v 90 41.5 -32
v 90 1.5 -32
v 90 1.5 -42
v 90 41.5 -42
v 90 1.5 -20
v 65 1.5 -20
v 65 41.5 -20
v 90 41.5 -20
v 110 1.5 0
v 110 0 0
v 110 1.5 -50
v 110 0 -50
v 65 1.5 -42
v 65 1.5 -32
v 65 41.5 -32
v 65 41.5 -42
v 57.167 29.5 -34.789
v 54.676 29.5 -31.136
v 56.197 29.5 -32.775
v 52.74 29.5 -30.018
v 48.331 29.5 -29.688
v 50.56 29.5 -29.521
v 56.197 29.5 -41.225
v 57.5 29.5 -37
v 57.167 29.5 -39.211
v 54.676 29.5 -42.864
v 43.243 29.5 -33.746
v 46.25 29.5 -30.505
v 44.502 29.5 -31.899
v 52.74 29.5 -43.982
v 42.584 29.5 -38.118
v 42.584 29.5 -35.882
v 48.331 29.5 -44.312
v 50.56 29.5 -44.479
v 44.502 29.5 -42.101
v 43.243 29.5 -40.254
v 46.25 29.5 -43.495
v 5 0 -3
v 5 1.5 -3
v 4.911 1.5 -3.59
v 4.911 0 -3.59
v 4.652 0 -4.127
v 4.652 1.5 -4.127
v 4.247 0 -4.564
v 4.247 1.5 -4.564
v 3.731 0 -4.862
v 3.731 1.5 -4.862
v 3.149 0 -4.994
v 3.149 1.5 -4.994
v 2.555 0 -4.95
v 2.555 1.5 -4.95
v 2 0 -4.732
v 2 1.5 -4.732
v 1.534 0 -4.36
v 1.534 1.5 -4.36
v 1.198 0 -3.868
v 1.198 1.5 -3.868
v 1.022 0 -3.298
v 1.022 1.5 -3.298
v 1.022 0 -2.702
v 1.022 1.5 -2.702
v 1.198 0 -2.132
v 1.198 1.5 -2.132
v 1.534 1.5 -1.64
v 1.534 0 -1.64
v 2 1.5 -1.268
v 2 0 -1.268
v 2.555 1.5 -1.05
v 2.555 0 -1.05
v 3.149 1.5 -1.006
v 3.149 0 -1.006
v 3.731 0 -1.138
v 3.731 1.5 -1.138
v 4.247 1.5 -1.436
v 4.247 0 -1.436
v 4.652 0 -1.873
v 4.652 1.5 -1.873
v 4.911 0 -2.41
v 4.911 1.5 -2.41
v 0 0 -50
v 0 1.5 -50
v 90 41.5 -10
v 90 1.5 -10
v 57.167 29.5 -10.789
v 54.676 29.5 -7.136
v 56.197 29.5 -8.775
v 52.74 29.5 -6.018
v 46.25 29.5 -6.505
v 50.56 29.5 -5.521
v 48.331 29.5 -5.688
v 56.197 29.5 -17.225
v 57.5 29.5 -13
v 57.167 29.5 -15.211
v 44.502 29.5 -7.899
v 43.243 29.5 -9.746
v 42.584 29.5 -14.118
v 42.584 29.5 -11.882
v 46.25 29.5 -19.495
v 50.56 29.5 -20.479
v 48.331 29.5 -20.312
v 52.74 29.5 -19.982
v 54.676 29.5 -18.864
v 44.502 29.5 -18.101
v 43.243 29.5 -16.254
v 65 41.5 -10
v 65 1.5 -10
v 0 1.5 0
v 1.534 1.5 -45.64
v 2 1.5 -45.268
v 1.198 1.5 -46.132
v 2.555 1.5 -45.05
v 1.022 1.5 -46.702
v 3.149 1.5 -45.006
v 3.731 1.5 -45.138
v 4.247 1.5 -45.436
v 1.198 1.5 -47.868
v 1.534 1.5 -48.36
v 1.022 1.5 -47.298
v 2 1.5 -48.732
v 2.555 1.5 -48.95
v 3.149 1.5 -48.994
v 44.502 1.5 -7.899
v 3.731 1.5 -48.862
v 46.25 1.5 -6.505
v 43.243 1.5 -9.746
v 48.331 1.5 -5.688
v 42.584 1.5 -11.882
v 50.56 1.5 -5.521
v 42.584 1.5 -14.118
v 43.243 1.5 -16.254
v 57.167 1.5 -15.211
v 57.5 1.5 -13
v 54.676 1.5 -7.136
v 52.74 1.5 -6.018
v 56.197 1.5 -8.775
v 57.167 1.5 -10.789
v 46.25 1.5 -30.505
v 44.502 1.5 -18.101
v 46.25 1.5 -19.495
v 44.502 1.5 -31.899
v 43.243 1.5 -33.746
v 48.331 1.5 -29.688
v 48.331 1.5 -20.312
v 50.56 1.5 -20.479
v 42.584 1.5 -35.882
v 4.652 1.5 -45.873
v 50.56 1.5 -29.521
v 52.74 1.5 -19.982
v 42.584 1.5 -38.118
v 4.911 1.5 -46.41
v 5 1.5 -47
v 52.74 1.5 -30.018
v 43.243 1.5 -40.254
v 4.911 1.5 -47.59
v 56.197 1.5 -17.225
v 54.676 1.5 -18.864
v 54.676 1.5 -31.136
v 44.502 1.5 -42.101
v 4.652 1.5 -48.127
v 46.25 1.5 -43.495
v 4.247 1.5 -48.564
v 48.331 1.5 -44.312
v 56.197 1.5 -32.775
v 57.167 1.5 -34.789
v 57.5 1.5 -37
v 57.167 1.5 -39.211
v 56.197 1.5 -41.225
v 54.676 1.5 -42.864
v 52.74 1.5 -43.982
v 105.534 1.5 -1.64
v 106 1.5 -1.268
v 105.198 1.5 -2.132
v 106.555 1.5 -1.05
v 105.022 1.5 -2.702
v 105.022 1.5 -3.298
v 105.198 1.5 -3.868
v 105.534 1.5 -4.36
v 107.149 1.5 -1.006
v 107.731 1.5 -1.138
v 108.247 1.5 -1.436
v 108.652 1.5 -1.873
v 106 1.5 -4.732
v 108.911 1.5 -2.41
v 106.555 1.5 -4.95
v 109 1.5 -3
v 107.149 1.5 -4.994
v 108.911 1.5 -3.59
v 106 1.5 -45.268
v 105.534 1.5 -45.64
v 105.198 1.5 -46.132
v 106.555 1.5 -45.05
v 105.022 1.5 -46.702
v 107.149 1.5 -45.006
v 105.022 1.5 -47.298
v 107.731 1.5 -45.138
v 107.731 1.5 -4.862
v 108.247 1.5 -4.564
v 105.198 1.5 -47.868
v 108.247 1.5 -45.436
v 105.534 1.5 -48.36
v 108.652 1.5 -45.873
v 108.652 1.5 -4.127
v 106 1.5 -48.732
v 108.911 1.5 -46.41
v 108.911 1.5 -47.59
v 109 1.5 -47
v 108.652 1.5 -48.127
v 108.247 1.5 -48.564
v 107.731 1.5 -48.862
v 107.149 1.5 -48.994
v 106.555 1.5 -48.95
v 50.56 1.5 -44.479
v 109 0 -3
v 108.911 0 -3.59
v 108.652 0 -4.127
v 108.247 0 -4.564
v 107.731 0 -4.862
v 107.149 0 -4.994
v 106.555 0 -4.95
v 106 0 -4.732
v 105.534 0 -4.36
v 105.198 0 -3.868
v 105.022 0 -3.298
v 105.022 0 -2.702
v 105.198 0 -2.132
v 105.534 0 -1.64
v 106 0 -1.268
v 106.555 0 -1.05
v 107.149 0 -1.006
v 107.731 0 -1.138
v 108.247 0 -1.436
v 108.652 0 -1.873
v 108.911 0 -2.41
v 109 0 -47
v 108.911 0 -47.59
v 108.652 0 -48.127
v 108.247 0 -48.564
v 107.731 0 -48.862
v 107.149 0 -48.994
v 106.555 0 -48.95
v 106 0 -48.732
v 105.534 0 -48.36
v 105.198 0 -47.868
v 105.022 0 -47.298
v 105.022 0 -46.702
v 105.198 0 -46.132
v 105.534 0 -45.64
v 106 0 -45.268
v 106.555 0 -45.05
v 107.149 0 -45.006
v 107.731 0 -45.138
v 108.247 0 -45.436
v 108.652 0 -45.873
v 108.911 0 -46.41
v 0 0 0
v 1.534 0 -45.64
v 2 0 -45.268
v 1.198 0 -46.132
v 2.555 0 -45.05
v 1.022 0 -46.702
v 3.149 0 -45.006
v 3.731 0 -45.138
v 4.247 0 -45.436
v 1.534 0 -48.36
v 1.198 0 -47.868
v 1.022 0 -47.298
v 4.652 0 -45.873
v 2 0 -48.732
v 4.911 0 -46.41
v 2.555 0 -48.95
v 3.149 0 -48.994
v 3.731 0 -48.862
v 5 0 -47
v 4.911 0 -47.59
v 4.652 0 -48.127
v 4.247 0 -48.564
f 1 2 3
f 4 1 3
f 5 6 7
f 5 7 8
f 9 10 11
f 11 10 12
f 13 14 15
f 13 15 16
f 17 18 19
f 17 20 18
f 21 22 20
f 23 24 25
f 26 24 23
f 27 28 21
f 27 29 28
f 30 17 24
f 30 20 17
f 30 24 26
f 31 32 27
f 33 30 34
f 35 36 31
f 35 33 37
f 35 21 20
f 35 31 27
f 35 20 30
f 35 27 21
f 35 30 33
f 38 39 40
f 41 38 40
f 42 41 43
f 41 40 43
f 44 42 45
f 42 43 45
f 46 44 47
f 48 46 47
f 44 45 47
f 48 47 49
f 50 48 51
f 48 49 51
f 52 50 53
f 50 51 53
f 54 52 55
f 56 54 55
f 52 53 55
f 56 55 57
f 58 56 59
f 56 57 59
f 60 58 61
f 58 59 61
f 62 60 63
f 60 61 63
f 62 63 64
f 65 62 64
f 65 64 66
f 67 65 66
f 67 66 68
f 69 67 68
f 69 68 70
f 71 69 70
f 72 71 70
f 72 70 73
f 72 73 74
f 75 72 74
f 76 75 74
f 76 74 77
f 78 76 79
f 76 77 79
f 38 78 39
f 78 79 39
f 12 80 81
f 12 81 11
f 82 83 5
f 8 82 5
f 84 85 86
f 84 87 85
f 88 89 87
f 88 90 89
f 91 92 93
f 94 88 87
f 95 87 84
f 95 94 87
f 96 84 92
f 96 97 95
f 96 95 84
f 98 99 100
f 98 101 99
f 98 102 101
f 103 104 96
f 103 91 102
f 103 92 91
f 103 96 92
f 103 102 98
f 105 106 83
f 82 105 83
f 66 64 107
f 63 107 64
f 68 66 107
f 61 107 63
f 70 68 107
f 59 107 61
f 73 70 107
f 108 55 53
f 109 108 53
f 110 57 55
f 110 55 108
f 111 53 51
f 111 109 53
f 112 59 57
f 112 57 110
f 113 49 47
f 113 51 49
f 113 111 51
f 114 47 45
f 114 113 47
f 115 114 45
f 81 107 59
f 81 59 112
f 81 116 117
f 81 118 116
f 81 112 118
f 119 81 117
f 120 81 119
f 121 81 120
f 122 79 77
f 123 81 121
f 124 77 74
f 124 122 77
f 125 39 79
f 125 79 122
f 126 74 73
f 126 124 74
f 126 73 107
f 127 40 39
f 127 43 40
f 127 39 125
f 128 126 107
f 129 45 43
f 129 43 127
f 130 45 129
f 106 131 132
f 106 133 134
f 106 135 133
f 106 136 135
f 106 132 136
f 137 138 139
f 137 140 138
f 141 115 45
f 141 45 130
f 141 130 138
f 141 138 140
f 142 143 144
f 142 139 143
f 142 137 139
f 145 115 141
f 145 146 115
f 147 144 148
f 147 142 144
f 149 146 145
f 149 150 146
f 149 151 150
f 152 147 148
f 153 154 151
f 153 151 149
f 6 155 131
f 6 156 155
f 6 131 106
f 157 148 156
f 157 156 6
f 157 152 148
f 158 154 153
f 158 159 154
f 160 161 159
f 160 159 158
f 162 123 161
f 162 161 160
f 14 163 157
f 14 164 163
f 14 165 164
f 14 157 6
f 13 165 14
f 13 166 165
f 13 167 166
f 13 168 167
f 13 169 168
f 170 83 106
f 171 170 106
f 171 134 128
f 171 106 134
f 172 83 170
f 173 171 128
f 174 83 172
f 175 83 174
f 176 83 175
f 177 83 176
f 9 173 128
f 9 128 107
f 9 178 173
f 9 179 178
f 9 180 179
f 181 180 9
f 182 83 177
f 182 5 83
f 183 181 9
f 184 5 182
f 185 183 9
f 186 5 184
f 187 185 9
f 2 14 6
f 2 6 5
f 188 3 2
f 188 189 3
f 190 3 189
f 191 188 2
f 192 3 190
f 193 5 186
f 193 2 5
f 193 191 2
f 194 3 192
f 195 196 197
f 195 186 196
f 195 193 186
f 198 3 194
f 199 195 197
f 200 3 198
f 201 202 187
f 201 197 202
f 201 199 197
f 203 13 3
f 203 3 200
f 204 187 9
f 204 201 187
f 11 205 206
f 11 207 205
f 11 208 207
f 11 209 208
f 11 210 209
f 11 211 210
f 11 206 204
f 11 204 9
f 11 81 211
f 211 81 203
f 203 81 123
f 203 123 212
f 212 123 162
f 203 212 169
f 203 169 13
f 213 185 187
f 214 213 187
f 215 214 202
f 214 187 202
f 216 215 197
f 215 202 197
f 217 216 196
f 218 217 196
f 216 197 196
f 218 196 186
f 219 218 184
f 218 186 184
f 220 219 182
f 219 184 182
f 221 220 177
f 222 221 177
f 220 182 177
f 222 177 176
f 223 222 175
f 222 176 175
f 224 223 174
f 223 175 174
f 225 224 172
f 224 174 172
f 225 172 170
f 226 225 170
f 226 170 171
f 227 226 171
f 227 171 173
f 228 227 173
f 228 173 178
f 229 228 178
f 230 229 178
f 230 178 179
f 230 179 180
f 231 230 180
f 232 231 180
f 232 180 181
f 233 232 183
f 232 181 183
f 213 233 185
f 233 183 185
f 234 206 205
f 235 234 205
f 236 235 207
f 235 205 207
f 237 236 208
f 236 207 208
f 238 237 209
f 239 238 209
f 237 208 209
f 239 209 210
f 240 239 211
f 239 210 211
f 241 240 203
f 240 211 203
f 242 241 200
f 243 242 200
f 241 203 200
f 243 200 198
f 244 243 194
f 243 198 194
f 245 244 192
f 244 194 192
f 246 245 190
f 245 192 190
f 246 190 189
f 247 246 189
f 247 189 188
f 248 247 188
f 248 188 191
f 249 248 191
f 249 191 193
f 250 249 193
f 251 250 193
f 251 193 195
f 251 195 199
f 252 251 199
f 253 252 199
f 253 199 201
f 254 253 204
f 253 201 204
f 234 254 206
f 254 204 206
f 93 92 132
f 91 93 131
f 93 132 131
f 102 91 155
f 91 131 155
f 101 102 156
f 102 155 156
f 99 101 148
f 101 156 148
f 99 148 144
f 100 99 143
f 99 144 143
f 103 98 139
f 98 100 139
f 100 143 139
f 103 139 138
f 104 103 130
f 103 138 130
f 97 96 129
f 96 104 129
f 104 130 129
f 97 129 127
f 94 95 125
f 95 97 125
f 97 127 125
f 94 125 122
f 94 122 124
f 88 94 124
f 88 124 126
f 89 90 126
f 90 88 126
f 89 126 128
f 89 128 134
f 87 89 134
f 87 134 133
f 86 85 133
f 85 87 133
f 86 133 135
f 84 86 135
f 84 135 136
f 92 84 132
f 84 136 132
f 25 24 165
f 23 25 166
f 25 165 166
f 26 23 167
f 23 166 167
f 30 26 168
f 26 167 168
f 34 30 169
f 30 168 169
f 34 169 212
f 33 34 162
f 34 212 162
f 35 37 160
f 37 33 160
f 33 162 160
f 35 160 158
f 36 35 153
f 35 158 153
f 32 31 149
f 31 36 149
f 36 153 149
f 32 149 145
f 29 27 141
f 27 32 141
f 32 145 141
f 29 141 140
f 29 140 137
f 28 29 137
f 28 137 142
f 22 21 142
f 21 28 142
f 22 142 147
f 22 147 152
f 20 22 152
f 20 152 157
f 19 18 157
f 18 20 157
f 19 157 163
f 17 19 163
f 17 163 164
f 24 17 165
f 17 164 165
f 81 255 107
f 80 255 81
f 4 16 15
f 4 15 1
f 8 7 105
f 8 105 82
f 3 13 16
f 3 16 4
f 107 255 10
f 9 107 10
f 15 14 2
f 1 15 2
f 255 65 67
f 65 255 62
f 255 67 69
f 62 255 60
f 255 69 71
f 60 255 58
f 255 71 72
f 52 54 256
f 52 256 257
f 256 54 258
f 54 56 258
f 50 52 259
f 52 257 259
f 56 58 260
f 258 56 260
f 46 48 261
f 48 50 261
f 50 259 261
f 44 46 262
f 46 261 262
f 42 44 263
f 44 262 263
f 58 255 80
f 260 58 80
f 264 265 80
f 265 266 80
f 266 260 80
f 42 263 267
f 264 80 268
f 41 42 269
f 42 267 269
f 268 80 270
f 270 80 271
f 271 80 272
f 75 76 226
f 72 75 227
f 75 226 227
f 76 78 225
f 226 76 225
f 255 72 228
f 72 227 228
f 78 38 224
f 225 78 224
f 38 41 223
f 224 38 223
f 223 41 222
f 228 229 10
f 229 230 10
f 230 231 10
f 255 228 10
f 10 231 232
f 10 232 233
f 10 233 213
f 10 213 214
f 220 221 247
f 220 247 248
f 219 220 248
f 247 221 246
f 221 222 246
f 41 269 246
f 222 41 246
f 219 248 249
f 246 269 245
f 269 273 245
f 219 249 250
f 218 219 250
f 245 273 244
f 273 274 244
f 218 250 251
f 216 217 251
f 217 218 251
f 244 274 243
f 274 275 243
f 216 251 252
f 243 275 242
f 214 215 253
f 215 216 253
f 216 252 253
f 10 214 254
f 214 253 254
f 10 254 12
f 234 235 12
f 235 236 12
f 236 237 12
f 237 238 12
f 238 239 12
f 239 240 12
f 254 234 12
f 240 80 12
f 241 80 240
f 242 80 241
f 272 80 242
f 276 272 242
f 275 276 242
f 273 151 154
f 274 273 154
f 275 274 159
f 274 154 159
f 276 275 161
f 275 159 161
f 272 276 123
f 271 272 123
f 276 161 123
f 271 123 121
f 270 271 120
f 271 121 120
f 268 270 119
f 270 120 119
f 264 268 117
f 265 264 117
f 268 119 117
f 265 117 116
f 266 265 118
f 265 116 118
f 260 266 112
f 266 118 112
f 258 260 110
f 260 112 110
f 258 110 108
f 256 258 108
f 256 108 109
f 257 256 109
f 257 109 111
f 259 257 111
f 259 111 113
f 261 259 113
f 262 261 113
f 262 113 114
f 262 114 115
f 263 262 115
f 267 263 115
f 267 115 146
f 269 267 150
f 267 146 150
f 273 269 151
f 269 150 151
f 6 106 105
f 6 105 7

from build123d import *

# Parameters (mm, degrees)
ESBO_O1_W                = 110
ESBO_O1_H                = 50
RESSALTO_EXTRUS_O1_DEPTH = 1.5
ESBO_O2_R                = 2
CORTE_EXTRUS_O1_DEPTH    = 1.5
ESBO_O4_R                = 7.5
ESBO_O4_W                = 25
ESBO_O4_H                = 10
RESSALTO_EXTRUS_O3_DEPTH = 40
ESBO_O5_W                = 39
ESBO_O5_H                = 12
CORTE_EXTRUS_O2_DEPTH    = 60


with BuildPart() as part:
    # Esboço1 → Ressalto-extrusão1 (new body)
    with BuildSketch(Plane(origin=(0, 0, 0), x_dir=(1, 0, 0), z_dir=(0, 1, 0))):
        with Locations((55, 25)):
            Rectangle(ESBO_O1_W, ESBO_O1_H)
    extrude(amount=RESSALTO_EXTRUS_O1_DEPTH)

    # Esboço2 → Corte-extrusão1 (cut)
    with BuildSketch(Plane(origin=(0, 1.5, 0), x_dir=(1, 0, 0), z_dir=(0, 1, 0))):
        with Locations((107, 3)):
            Circle(ESBO_O2_R)
        with Locations((107, 47)):
            Circle(ESBO_O2_R)
        with Locations((3, 3)):
            Circle(ESBO_O2_R)
        with Locations((3, 47)):
            Circle(ESBO_O2_R)
    extrude(amount=-CORTE_EXTRUS_O1_DEPTH, mode=Mode.SUBTRACT)

    # Esboço4 → Ressalto-extrusão3 (add)
    with BuildSketch(Plane(origin=(0, 1.5, 0), x_dir=(1, 0, 0), z_dir=(0, 1, 0))):
        with Locations((50, 37)):
            Circle(ESBO_O4_R)
        with Locations((50, 13)):
            Circle(ESBO_O4_R)
        with Locations((77.5, 37)):
            Rectangle(ESBO_O4_W, ESBO_O4_H)
        with Locations((77.5, 15)):
            Rectangle(ESBO_O4_W, ESBO_O4_H)
    extrude(amount=RESSALTO_EXTRUS_O3_DEPTH)

    # Esboço5 → Corte-extrusão2 (cut)
    with BuildSketch(Plane(origin=(0, 0, 0), x_dir=(0, 0, -1), z_dir=(1, 0, 0))):
        with Locations((25, 35.5)):
            Rectangle(ESBO_O5_W, ESBO_O5_H)
    extrude(amount=CORTE_EXTRUS_O2_DEPTH, mode=Mode.SUBTRACT)


solid = part.part
